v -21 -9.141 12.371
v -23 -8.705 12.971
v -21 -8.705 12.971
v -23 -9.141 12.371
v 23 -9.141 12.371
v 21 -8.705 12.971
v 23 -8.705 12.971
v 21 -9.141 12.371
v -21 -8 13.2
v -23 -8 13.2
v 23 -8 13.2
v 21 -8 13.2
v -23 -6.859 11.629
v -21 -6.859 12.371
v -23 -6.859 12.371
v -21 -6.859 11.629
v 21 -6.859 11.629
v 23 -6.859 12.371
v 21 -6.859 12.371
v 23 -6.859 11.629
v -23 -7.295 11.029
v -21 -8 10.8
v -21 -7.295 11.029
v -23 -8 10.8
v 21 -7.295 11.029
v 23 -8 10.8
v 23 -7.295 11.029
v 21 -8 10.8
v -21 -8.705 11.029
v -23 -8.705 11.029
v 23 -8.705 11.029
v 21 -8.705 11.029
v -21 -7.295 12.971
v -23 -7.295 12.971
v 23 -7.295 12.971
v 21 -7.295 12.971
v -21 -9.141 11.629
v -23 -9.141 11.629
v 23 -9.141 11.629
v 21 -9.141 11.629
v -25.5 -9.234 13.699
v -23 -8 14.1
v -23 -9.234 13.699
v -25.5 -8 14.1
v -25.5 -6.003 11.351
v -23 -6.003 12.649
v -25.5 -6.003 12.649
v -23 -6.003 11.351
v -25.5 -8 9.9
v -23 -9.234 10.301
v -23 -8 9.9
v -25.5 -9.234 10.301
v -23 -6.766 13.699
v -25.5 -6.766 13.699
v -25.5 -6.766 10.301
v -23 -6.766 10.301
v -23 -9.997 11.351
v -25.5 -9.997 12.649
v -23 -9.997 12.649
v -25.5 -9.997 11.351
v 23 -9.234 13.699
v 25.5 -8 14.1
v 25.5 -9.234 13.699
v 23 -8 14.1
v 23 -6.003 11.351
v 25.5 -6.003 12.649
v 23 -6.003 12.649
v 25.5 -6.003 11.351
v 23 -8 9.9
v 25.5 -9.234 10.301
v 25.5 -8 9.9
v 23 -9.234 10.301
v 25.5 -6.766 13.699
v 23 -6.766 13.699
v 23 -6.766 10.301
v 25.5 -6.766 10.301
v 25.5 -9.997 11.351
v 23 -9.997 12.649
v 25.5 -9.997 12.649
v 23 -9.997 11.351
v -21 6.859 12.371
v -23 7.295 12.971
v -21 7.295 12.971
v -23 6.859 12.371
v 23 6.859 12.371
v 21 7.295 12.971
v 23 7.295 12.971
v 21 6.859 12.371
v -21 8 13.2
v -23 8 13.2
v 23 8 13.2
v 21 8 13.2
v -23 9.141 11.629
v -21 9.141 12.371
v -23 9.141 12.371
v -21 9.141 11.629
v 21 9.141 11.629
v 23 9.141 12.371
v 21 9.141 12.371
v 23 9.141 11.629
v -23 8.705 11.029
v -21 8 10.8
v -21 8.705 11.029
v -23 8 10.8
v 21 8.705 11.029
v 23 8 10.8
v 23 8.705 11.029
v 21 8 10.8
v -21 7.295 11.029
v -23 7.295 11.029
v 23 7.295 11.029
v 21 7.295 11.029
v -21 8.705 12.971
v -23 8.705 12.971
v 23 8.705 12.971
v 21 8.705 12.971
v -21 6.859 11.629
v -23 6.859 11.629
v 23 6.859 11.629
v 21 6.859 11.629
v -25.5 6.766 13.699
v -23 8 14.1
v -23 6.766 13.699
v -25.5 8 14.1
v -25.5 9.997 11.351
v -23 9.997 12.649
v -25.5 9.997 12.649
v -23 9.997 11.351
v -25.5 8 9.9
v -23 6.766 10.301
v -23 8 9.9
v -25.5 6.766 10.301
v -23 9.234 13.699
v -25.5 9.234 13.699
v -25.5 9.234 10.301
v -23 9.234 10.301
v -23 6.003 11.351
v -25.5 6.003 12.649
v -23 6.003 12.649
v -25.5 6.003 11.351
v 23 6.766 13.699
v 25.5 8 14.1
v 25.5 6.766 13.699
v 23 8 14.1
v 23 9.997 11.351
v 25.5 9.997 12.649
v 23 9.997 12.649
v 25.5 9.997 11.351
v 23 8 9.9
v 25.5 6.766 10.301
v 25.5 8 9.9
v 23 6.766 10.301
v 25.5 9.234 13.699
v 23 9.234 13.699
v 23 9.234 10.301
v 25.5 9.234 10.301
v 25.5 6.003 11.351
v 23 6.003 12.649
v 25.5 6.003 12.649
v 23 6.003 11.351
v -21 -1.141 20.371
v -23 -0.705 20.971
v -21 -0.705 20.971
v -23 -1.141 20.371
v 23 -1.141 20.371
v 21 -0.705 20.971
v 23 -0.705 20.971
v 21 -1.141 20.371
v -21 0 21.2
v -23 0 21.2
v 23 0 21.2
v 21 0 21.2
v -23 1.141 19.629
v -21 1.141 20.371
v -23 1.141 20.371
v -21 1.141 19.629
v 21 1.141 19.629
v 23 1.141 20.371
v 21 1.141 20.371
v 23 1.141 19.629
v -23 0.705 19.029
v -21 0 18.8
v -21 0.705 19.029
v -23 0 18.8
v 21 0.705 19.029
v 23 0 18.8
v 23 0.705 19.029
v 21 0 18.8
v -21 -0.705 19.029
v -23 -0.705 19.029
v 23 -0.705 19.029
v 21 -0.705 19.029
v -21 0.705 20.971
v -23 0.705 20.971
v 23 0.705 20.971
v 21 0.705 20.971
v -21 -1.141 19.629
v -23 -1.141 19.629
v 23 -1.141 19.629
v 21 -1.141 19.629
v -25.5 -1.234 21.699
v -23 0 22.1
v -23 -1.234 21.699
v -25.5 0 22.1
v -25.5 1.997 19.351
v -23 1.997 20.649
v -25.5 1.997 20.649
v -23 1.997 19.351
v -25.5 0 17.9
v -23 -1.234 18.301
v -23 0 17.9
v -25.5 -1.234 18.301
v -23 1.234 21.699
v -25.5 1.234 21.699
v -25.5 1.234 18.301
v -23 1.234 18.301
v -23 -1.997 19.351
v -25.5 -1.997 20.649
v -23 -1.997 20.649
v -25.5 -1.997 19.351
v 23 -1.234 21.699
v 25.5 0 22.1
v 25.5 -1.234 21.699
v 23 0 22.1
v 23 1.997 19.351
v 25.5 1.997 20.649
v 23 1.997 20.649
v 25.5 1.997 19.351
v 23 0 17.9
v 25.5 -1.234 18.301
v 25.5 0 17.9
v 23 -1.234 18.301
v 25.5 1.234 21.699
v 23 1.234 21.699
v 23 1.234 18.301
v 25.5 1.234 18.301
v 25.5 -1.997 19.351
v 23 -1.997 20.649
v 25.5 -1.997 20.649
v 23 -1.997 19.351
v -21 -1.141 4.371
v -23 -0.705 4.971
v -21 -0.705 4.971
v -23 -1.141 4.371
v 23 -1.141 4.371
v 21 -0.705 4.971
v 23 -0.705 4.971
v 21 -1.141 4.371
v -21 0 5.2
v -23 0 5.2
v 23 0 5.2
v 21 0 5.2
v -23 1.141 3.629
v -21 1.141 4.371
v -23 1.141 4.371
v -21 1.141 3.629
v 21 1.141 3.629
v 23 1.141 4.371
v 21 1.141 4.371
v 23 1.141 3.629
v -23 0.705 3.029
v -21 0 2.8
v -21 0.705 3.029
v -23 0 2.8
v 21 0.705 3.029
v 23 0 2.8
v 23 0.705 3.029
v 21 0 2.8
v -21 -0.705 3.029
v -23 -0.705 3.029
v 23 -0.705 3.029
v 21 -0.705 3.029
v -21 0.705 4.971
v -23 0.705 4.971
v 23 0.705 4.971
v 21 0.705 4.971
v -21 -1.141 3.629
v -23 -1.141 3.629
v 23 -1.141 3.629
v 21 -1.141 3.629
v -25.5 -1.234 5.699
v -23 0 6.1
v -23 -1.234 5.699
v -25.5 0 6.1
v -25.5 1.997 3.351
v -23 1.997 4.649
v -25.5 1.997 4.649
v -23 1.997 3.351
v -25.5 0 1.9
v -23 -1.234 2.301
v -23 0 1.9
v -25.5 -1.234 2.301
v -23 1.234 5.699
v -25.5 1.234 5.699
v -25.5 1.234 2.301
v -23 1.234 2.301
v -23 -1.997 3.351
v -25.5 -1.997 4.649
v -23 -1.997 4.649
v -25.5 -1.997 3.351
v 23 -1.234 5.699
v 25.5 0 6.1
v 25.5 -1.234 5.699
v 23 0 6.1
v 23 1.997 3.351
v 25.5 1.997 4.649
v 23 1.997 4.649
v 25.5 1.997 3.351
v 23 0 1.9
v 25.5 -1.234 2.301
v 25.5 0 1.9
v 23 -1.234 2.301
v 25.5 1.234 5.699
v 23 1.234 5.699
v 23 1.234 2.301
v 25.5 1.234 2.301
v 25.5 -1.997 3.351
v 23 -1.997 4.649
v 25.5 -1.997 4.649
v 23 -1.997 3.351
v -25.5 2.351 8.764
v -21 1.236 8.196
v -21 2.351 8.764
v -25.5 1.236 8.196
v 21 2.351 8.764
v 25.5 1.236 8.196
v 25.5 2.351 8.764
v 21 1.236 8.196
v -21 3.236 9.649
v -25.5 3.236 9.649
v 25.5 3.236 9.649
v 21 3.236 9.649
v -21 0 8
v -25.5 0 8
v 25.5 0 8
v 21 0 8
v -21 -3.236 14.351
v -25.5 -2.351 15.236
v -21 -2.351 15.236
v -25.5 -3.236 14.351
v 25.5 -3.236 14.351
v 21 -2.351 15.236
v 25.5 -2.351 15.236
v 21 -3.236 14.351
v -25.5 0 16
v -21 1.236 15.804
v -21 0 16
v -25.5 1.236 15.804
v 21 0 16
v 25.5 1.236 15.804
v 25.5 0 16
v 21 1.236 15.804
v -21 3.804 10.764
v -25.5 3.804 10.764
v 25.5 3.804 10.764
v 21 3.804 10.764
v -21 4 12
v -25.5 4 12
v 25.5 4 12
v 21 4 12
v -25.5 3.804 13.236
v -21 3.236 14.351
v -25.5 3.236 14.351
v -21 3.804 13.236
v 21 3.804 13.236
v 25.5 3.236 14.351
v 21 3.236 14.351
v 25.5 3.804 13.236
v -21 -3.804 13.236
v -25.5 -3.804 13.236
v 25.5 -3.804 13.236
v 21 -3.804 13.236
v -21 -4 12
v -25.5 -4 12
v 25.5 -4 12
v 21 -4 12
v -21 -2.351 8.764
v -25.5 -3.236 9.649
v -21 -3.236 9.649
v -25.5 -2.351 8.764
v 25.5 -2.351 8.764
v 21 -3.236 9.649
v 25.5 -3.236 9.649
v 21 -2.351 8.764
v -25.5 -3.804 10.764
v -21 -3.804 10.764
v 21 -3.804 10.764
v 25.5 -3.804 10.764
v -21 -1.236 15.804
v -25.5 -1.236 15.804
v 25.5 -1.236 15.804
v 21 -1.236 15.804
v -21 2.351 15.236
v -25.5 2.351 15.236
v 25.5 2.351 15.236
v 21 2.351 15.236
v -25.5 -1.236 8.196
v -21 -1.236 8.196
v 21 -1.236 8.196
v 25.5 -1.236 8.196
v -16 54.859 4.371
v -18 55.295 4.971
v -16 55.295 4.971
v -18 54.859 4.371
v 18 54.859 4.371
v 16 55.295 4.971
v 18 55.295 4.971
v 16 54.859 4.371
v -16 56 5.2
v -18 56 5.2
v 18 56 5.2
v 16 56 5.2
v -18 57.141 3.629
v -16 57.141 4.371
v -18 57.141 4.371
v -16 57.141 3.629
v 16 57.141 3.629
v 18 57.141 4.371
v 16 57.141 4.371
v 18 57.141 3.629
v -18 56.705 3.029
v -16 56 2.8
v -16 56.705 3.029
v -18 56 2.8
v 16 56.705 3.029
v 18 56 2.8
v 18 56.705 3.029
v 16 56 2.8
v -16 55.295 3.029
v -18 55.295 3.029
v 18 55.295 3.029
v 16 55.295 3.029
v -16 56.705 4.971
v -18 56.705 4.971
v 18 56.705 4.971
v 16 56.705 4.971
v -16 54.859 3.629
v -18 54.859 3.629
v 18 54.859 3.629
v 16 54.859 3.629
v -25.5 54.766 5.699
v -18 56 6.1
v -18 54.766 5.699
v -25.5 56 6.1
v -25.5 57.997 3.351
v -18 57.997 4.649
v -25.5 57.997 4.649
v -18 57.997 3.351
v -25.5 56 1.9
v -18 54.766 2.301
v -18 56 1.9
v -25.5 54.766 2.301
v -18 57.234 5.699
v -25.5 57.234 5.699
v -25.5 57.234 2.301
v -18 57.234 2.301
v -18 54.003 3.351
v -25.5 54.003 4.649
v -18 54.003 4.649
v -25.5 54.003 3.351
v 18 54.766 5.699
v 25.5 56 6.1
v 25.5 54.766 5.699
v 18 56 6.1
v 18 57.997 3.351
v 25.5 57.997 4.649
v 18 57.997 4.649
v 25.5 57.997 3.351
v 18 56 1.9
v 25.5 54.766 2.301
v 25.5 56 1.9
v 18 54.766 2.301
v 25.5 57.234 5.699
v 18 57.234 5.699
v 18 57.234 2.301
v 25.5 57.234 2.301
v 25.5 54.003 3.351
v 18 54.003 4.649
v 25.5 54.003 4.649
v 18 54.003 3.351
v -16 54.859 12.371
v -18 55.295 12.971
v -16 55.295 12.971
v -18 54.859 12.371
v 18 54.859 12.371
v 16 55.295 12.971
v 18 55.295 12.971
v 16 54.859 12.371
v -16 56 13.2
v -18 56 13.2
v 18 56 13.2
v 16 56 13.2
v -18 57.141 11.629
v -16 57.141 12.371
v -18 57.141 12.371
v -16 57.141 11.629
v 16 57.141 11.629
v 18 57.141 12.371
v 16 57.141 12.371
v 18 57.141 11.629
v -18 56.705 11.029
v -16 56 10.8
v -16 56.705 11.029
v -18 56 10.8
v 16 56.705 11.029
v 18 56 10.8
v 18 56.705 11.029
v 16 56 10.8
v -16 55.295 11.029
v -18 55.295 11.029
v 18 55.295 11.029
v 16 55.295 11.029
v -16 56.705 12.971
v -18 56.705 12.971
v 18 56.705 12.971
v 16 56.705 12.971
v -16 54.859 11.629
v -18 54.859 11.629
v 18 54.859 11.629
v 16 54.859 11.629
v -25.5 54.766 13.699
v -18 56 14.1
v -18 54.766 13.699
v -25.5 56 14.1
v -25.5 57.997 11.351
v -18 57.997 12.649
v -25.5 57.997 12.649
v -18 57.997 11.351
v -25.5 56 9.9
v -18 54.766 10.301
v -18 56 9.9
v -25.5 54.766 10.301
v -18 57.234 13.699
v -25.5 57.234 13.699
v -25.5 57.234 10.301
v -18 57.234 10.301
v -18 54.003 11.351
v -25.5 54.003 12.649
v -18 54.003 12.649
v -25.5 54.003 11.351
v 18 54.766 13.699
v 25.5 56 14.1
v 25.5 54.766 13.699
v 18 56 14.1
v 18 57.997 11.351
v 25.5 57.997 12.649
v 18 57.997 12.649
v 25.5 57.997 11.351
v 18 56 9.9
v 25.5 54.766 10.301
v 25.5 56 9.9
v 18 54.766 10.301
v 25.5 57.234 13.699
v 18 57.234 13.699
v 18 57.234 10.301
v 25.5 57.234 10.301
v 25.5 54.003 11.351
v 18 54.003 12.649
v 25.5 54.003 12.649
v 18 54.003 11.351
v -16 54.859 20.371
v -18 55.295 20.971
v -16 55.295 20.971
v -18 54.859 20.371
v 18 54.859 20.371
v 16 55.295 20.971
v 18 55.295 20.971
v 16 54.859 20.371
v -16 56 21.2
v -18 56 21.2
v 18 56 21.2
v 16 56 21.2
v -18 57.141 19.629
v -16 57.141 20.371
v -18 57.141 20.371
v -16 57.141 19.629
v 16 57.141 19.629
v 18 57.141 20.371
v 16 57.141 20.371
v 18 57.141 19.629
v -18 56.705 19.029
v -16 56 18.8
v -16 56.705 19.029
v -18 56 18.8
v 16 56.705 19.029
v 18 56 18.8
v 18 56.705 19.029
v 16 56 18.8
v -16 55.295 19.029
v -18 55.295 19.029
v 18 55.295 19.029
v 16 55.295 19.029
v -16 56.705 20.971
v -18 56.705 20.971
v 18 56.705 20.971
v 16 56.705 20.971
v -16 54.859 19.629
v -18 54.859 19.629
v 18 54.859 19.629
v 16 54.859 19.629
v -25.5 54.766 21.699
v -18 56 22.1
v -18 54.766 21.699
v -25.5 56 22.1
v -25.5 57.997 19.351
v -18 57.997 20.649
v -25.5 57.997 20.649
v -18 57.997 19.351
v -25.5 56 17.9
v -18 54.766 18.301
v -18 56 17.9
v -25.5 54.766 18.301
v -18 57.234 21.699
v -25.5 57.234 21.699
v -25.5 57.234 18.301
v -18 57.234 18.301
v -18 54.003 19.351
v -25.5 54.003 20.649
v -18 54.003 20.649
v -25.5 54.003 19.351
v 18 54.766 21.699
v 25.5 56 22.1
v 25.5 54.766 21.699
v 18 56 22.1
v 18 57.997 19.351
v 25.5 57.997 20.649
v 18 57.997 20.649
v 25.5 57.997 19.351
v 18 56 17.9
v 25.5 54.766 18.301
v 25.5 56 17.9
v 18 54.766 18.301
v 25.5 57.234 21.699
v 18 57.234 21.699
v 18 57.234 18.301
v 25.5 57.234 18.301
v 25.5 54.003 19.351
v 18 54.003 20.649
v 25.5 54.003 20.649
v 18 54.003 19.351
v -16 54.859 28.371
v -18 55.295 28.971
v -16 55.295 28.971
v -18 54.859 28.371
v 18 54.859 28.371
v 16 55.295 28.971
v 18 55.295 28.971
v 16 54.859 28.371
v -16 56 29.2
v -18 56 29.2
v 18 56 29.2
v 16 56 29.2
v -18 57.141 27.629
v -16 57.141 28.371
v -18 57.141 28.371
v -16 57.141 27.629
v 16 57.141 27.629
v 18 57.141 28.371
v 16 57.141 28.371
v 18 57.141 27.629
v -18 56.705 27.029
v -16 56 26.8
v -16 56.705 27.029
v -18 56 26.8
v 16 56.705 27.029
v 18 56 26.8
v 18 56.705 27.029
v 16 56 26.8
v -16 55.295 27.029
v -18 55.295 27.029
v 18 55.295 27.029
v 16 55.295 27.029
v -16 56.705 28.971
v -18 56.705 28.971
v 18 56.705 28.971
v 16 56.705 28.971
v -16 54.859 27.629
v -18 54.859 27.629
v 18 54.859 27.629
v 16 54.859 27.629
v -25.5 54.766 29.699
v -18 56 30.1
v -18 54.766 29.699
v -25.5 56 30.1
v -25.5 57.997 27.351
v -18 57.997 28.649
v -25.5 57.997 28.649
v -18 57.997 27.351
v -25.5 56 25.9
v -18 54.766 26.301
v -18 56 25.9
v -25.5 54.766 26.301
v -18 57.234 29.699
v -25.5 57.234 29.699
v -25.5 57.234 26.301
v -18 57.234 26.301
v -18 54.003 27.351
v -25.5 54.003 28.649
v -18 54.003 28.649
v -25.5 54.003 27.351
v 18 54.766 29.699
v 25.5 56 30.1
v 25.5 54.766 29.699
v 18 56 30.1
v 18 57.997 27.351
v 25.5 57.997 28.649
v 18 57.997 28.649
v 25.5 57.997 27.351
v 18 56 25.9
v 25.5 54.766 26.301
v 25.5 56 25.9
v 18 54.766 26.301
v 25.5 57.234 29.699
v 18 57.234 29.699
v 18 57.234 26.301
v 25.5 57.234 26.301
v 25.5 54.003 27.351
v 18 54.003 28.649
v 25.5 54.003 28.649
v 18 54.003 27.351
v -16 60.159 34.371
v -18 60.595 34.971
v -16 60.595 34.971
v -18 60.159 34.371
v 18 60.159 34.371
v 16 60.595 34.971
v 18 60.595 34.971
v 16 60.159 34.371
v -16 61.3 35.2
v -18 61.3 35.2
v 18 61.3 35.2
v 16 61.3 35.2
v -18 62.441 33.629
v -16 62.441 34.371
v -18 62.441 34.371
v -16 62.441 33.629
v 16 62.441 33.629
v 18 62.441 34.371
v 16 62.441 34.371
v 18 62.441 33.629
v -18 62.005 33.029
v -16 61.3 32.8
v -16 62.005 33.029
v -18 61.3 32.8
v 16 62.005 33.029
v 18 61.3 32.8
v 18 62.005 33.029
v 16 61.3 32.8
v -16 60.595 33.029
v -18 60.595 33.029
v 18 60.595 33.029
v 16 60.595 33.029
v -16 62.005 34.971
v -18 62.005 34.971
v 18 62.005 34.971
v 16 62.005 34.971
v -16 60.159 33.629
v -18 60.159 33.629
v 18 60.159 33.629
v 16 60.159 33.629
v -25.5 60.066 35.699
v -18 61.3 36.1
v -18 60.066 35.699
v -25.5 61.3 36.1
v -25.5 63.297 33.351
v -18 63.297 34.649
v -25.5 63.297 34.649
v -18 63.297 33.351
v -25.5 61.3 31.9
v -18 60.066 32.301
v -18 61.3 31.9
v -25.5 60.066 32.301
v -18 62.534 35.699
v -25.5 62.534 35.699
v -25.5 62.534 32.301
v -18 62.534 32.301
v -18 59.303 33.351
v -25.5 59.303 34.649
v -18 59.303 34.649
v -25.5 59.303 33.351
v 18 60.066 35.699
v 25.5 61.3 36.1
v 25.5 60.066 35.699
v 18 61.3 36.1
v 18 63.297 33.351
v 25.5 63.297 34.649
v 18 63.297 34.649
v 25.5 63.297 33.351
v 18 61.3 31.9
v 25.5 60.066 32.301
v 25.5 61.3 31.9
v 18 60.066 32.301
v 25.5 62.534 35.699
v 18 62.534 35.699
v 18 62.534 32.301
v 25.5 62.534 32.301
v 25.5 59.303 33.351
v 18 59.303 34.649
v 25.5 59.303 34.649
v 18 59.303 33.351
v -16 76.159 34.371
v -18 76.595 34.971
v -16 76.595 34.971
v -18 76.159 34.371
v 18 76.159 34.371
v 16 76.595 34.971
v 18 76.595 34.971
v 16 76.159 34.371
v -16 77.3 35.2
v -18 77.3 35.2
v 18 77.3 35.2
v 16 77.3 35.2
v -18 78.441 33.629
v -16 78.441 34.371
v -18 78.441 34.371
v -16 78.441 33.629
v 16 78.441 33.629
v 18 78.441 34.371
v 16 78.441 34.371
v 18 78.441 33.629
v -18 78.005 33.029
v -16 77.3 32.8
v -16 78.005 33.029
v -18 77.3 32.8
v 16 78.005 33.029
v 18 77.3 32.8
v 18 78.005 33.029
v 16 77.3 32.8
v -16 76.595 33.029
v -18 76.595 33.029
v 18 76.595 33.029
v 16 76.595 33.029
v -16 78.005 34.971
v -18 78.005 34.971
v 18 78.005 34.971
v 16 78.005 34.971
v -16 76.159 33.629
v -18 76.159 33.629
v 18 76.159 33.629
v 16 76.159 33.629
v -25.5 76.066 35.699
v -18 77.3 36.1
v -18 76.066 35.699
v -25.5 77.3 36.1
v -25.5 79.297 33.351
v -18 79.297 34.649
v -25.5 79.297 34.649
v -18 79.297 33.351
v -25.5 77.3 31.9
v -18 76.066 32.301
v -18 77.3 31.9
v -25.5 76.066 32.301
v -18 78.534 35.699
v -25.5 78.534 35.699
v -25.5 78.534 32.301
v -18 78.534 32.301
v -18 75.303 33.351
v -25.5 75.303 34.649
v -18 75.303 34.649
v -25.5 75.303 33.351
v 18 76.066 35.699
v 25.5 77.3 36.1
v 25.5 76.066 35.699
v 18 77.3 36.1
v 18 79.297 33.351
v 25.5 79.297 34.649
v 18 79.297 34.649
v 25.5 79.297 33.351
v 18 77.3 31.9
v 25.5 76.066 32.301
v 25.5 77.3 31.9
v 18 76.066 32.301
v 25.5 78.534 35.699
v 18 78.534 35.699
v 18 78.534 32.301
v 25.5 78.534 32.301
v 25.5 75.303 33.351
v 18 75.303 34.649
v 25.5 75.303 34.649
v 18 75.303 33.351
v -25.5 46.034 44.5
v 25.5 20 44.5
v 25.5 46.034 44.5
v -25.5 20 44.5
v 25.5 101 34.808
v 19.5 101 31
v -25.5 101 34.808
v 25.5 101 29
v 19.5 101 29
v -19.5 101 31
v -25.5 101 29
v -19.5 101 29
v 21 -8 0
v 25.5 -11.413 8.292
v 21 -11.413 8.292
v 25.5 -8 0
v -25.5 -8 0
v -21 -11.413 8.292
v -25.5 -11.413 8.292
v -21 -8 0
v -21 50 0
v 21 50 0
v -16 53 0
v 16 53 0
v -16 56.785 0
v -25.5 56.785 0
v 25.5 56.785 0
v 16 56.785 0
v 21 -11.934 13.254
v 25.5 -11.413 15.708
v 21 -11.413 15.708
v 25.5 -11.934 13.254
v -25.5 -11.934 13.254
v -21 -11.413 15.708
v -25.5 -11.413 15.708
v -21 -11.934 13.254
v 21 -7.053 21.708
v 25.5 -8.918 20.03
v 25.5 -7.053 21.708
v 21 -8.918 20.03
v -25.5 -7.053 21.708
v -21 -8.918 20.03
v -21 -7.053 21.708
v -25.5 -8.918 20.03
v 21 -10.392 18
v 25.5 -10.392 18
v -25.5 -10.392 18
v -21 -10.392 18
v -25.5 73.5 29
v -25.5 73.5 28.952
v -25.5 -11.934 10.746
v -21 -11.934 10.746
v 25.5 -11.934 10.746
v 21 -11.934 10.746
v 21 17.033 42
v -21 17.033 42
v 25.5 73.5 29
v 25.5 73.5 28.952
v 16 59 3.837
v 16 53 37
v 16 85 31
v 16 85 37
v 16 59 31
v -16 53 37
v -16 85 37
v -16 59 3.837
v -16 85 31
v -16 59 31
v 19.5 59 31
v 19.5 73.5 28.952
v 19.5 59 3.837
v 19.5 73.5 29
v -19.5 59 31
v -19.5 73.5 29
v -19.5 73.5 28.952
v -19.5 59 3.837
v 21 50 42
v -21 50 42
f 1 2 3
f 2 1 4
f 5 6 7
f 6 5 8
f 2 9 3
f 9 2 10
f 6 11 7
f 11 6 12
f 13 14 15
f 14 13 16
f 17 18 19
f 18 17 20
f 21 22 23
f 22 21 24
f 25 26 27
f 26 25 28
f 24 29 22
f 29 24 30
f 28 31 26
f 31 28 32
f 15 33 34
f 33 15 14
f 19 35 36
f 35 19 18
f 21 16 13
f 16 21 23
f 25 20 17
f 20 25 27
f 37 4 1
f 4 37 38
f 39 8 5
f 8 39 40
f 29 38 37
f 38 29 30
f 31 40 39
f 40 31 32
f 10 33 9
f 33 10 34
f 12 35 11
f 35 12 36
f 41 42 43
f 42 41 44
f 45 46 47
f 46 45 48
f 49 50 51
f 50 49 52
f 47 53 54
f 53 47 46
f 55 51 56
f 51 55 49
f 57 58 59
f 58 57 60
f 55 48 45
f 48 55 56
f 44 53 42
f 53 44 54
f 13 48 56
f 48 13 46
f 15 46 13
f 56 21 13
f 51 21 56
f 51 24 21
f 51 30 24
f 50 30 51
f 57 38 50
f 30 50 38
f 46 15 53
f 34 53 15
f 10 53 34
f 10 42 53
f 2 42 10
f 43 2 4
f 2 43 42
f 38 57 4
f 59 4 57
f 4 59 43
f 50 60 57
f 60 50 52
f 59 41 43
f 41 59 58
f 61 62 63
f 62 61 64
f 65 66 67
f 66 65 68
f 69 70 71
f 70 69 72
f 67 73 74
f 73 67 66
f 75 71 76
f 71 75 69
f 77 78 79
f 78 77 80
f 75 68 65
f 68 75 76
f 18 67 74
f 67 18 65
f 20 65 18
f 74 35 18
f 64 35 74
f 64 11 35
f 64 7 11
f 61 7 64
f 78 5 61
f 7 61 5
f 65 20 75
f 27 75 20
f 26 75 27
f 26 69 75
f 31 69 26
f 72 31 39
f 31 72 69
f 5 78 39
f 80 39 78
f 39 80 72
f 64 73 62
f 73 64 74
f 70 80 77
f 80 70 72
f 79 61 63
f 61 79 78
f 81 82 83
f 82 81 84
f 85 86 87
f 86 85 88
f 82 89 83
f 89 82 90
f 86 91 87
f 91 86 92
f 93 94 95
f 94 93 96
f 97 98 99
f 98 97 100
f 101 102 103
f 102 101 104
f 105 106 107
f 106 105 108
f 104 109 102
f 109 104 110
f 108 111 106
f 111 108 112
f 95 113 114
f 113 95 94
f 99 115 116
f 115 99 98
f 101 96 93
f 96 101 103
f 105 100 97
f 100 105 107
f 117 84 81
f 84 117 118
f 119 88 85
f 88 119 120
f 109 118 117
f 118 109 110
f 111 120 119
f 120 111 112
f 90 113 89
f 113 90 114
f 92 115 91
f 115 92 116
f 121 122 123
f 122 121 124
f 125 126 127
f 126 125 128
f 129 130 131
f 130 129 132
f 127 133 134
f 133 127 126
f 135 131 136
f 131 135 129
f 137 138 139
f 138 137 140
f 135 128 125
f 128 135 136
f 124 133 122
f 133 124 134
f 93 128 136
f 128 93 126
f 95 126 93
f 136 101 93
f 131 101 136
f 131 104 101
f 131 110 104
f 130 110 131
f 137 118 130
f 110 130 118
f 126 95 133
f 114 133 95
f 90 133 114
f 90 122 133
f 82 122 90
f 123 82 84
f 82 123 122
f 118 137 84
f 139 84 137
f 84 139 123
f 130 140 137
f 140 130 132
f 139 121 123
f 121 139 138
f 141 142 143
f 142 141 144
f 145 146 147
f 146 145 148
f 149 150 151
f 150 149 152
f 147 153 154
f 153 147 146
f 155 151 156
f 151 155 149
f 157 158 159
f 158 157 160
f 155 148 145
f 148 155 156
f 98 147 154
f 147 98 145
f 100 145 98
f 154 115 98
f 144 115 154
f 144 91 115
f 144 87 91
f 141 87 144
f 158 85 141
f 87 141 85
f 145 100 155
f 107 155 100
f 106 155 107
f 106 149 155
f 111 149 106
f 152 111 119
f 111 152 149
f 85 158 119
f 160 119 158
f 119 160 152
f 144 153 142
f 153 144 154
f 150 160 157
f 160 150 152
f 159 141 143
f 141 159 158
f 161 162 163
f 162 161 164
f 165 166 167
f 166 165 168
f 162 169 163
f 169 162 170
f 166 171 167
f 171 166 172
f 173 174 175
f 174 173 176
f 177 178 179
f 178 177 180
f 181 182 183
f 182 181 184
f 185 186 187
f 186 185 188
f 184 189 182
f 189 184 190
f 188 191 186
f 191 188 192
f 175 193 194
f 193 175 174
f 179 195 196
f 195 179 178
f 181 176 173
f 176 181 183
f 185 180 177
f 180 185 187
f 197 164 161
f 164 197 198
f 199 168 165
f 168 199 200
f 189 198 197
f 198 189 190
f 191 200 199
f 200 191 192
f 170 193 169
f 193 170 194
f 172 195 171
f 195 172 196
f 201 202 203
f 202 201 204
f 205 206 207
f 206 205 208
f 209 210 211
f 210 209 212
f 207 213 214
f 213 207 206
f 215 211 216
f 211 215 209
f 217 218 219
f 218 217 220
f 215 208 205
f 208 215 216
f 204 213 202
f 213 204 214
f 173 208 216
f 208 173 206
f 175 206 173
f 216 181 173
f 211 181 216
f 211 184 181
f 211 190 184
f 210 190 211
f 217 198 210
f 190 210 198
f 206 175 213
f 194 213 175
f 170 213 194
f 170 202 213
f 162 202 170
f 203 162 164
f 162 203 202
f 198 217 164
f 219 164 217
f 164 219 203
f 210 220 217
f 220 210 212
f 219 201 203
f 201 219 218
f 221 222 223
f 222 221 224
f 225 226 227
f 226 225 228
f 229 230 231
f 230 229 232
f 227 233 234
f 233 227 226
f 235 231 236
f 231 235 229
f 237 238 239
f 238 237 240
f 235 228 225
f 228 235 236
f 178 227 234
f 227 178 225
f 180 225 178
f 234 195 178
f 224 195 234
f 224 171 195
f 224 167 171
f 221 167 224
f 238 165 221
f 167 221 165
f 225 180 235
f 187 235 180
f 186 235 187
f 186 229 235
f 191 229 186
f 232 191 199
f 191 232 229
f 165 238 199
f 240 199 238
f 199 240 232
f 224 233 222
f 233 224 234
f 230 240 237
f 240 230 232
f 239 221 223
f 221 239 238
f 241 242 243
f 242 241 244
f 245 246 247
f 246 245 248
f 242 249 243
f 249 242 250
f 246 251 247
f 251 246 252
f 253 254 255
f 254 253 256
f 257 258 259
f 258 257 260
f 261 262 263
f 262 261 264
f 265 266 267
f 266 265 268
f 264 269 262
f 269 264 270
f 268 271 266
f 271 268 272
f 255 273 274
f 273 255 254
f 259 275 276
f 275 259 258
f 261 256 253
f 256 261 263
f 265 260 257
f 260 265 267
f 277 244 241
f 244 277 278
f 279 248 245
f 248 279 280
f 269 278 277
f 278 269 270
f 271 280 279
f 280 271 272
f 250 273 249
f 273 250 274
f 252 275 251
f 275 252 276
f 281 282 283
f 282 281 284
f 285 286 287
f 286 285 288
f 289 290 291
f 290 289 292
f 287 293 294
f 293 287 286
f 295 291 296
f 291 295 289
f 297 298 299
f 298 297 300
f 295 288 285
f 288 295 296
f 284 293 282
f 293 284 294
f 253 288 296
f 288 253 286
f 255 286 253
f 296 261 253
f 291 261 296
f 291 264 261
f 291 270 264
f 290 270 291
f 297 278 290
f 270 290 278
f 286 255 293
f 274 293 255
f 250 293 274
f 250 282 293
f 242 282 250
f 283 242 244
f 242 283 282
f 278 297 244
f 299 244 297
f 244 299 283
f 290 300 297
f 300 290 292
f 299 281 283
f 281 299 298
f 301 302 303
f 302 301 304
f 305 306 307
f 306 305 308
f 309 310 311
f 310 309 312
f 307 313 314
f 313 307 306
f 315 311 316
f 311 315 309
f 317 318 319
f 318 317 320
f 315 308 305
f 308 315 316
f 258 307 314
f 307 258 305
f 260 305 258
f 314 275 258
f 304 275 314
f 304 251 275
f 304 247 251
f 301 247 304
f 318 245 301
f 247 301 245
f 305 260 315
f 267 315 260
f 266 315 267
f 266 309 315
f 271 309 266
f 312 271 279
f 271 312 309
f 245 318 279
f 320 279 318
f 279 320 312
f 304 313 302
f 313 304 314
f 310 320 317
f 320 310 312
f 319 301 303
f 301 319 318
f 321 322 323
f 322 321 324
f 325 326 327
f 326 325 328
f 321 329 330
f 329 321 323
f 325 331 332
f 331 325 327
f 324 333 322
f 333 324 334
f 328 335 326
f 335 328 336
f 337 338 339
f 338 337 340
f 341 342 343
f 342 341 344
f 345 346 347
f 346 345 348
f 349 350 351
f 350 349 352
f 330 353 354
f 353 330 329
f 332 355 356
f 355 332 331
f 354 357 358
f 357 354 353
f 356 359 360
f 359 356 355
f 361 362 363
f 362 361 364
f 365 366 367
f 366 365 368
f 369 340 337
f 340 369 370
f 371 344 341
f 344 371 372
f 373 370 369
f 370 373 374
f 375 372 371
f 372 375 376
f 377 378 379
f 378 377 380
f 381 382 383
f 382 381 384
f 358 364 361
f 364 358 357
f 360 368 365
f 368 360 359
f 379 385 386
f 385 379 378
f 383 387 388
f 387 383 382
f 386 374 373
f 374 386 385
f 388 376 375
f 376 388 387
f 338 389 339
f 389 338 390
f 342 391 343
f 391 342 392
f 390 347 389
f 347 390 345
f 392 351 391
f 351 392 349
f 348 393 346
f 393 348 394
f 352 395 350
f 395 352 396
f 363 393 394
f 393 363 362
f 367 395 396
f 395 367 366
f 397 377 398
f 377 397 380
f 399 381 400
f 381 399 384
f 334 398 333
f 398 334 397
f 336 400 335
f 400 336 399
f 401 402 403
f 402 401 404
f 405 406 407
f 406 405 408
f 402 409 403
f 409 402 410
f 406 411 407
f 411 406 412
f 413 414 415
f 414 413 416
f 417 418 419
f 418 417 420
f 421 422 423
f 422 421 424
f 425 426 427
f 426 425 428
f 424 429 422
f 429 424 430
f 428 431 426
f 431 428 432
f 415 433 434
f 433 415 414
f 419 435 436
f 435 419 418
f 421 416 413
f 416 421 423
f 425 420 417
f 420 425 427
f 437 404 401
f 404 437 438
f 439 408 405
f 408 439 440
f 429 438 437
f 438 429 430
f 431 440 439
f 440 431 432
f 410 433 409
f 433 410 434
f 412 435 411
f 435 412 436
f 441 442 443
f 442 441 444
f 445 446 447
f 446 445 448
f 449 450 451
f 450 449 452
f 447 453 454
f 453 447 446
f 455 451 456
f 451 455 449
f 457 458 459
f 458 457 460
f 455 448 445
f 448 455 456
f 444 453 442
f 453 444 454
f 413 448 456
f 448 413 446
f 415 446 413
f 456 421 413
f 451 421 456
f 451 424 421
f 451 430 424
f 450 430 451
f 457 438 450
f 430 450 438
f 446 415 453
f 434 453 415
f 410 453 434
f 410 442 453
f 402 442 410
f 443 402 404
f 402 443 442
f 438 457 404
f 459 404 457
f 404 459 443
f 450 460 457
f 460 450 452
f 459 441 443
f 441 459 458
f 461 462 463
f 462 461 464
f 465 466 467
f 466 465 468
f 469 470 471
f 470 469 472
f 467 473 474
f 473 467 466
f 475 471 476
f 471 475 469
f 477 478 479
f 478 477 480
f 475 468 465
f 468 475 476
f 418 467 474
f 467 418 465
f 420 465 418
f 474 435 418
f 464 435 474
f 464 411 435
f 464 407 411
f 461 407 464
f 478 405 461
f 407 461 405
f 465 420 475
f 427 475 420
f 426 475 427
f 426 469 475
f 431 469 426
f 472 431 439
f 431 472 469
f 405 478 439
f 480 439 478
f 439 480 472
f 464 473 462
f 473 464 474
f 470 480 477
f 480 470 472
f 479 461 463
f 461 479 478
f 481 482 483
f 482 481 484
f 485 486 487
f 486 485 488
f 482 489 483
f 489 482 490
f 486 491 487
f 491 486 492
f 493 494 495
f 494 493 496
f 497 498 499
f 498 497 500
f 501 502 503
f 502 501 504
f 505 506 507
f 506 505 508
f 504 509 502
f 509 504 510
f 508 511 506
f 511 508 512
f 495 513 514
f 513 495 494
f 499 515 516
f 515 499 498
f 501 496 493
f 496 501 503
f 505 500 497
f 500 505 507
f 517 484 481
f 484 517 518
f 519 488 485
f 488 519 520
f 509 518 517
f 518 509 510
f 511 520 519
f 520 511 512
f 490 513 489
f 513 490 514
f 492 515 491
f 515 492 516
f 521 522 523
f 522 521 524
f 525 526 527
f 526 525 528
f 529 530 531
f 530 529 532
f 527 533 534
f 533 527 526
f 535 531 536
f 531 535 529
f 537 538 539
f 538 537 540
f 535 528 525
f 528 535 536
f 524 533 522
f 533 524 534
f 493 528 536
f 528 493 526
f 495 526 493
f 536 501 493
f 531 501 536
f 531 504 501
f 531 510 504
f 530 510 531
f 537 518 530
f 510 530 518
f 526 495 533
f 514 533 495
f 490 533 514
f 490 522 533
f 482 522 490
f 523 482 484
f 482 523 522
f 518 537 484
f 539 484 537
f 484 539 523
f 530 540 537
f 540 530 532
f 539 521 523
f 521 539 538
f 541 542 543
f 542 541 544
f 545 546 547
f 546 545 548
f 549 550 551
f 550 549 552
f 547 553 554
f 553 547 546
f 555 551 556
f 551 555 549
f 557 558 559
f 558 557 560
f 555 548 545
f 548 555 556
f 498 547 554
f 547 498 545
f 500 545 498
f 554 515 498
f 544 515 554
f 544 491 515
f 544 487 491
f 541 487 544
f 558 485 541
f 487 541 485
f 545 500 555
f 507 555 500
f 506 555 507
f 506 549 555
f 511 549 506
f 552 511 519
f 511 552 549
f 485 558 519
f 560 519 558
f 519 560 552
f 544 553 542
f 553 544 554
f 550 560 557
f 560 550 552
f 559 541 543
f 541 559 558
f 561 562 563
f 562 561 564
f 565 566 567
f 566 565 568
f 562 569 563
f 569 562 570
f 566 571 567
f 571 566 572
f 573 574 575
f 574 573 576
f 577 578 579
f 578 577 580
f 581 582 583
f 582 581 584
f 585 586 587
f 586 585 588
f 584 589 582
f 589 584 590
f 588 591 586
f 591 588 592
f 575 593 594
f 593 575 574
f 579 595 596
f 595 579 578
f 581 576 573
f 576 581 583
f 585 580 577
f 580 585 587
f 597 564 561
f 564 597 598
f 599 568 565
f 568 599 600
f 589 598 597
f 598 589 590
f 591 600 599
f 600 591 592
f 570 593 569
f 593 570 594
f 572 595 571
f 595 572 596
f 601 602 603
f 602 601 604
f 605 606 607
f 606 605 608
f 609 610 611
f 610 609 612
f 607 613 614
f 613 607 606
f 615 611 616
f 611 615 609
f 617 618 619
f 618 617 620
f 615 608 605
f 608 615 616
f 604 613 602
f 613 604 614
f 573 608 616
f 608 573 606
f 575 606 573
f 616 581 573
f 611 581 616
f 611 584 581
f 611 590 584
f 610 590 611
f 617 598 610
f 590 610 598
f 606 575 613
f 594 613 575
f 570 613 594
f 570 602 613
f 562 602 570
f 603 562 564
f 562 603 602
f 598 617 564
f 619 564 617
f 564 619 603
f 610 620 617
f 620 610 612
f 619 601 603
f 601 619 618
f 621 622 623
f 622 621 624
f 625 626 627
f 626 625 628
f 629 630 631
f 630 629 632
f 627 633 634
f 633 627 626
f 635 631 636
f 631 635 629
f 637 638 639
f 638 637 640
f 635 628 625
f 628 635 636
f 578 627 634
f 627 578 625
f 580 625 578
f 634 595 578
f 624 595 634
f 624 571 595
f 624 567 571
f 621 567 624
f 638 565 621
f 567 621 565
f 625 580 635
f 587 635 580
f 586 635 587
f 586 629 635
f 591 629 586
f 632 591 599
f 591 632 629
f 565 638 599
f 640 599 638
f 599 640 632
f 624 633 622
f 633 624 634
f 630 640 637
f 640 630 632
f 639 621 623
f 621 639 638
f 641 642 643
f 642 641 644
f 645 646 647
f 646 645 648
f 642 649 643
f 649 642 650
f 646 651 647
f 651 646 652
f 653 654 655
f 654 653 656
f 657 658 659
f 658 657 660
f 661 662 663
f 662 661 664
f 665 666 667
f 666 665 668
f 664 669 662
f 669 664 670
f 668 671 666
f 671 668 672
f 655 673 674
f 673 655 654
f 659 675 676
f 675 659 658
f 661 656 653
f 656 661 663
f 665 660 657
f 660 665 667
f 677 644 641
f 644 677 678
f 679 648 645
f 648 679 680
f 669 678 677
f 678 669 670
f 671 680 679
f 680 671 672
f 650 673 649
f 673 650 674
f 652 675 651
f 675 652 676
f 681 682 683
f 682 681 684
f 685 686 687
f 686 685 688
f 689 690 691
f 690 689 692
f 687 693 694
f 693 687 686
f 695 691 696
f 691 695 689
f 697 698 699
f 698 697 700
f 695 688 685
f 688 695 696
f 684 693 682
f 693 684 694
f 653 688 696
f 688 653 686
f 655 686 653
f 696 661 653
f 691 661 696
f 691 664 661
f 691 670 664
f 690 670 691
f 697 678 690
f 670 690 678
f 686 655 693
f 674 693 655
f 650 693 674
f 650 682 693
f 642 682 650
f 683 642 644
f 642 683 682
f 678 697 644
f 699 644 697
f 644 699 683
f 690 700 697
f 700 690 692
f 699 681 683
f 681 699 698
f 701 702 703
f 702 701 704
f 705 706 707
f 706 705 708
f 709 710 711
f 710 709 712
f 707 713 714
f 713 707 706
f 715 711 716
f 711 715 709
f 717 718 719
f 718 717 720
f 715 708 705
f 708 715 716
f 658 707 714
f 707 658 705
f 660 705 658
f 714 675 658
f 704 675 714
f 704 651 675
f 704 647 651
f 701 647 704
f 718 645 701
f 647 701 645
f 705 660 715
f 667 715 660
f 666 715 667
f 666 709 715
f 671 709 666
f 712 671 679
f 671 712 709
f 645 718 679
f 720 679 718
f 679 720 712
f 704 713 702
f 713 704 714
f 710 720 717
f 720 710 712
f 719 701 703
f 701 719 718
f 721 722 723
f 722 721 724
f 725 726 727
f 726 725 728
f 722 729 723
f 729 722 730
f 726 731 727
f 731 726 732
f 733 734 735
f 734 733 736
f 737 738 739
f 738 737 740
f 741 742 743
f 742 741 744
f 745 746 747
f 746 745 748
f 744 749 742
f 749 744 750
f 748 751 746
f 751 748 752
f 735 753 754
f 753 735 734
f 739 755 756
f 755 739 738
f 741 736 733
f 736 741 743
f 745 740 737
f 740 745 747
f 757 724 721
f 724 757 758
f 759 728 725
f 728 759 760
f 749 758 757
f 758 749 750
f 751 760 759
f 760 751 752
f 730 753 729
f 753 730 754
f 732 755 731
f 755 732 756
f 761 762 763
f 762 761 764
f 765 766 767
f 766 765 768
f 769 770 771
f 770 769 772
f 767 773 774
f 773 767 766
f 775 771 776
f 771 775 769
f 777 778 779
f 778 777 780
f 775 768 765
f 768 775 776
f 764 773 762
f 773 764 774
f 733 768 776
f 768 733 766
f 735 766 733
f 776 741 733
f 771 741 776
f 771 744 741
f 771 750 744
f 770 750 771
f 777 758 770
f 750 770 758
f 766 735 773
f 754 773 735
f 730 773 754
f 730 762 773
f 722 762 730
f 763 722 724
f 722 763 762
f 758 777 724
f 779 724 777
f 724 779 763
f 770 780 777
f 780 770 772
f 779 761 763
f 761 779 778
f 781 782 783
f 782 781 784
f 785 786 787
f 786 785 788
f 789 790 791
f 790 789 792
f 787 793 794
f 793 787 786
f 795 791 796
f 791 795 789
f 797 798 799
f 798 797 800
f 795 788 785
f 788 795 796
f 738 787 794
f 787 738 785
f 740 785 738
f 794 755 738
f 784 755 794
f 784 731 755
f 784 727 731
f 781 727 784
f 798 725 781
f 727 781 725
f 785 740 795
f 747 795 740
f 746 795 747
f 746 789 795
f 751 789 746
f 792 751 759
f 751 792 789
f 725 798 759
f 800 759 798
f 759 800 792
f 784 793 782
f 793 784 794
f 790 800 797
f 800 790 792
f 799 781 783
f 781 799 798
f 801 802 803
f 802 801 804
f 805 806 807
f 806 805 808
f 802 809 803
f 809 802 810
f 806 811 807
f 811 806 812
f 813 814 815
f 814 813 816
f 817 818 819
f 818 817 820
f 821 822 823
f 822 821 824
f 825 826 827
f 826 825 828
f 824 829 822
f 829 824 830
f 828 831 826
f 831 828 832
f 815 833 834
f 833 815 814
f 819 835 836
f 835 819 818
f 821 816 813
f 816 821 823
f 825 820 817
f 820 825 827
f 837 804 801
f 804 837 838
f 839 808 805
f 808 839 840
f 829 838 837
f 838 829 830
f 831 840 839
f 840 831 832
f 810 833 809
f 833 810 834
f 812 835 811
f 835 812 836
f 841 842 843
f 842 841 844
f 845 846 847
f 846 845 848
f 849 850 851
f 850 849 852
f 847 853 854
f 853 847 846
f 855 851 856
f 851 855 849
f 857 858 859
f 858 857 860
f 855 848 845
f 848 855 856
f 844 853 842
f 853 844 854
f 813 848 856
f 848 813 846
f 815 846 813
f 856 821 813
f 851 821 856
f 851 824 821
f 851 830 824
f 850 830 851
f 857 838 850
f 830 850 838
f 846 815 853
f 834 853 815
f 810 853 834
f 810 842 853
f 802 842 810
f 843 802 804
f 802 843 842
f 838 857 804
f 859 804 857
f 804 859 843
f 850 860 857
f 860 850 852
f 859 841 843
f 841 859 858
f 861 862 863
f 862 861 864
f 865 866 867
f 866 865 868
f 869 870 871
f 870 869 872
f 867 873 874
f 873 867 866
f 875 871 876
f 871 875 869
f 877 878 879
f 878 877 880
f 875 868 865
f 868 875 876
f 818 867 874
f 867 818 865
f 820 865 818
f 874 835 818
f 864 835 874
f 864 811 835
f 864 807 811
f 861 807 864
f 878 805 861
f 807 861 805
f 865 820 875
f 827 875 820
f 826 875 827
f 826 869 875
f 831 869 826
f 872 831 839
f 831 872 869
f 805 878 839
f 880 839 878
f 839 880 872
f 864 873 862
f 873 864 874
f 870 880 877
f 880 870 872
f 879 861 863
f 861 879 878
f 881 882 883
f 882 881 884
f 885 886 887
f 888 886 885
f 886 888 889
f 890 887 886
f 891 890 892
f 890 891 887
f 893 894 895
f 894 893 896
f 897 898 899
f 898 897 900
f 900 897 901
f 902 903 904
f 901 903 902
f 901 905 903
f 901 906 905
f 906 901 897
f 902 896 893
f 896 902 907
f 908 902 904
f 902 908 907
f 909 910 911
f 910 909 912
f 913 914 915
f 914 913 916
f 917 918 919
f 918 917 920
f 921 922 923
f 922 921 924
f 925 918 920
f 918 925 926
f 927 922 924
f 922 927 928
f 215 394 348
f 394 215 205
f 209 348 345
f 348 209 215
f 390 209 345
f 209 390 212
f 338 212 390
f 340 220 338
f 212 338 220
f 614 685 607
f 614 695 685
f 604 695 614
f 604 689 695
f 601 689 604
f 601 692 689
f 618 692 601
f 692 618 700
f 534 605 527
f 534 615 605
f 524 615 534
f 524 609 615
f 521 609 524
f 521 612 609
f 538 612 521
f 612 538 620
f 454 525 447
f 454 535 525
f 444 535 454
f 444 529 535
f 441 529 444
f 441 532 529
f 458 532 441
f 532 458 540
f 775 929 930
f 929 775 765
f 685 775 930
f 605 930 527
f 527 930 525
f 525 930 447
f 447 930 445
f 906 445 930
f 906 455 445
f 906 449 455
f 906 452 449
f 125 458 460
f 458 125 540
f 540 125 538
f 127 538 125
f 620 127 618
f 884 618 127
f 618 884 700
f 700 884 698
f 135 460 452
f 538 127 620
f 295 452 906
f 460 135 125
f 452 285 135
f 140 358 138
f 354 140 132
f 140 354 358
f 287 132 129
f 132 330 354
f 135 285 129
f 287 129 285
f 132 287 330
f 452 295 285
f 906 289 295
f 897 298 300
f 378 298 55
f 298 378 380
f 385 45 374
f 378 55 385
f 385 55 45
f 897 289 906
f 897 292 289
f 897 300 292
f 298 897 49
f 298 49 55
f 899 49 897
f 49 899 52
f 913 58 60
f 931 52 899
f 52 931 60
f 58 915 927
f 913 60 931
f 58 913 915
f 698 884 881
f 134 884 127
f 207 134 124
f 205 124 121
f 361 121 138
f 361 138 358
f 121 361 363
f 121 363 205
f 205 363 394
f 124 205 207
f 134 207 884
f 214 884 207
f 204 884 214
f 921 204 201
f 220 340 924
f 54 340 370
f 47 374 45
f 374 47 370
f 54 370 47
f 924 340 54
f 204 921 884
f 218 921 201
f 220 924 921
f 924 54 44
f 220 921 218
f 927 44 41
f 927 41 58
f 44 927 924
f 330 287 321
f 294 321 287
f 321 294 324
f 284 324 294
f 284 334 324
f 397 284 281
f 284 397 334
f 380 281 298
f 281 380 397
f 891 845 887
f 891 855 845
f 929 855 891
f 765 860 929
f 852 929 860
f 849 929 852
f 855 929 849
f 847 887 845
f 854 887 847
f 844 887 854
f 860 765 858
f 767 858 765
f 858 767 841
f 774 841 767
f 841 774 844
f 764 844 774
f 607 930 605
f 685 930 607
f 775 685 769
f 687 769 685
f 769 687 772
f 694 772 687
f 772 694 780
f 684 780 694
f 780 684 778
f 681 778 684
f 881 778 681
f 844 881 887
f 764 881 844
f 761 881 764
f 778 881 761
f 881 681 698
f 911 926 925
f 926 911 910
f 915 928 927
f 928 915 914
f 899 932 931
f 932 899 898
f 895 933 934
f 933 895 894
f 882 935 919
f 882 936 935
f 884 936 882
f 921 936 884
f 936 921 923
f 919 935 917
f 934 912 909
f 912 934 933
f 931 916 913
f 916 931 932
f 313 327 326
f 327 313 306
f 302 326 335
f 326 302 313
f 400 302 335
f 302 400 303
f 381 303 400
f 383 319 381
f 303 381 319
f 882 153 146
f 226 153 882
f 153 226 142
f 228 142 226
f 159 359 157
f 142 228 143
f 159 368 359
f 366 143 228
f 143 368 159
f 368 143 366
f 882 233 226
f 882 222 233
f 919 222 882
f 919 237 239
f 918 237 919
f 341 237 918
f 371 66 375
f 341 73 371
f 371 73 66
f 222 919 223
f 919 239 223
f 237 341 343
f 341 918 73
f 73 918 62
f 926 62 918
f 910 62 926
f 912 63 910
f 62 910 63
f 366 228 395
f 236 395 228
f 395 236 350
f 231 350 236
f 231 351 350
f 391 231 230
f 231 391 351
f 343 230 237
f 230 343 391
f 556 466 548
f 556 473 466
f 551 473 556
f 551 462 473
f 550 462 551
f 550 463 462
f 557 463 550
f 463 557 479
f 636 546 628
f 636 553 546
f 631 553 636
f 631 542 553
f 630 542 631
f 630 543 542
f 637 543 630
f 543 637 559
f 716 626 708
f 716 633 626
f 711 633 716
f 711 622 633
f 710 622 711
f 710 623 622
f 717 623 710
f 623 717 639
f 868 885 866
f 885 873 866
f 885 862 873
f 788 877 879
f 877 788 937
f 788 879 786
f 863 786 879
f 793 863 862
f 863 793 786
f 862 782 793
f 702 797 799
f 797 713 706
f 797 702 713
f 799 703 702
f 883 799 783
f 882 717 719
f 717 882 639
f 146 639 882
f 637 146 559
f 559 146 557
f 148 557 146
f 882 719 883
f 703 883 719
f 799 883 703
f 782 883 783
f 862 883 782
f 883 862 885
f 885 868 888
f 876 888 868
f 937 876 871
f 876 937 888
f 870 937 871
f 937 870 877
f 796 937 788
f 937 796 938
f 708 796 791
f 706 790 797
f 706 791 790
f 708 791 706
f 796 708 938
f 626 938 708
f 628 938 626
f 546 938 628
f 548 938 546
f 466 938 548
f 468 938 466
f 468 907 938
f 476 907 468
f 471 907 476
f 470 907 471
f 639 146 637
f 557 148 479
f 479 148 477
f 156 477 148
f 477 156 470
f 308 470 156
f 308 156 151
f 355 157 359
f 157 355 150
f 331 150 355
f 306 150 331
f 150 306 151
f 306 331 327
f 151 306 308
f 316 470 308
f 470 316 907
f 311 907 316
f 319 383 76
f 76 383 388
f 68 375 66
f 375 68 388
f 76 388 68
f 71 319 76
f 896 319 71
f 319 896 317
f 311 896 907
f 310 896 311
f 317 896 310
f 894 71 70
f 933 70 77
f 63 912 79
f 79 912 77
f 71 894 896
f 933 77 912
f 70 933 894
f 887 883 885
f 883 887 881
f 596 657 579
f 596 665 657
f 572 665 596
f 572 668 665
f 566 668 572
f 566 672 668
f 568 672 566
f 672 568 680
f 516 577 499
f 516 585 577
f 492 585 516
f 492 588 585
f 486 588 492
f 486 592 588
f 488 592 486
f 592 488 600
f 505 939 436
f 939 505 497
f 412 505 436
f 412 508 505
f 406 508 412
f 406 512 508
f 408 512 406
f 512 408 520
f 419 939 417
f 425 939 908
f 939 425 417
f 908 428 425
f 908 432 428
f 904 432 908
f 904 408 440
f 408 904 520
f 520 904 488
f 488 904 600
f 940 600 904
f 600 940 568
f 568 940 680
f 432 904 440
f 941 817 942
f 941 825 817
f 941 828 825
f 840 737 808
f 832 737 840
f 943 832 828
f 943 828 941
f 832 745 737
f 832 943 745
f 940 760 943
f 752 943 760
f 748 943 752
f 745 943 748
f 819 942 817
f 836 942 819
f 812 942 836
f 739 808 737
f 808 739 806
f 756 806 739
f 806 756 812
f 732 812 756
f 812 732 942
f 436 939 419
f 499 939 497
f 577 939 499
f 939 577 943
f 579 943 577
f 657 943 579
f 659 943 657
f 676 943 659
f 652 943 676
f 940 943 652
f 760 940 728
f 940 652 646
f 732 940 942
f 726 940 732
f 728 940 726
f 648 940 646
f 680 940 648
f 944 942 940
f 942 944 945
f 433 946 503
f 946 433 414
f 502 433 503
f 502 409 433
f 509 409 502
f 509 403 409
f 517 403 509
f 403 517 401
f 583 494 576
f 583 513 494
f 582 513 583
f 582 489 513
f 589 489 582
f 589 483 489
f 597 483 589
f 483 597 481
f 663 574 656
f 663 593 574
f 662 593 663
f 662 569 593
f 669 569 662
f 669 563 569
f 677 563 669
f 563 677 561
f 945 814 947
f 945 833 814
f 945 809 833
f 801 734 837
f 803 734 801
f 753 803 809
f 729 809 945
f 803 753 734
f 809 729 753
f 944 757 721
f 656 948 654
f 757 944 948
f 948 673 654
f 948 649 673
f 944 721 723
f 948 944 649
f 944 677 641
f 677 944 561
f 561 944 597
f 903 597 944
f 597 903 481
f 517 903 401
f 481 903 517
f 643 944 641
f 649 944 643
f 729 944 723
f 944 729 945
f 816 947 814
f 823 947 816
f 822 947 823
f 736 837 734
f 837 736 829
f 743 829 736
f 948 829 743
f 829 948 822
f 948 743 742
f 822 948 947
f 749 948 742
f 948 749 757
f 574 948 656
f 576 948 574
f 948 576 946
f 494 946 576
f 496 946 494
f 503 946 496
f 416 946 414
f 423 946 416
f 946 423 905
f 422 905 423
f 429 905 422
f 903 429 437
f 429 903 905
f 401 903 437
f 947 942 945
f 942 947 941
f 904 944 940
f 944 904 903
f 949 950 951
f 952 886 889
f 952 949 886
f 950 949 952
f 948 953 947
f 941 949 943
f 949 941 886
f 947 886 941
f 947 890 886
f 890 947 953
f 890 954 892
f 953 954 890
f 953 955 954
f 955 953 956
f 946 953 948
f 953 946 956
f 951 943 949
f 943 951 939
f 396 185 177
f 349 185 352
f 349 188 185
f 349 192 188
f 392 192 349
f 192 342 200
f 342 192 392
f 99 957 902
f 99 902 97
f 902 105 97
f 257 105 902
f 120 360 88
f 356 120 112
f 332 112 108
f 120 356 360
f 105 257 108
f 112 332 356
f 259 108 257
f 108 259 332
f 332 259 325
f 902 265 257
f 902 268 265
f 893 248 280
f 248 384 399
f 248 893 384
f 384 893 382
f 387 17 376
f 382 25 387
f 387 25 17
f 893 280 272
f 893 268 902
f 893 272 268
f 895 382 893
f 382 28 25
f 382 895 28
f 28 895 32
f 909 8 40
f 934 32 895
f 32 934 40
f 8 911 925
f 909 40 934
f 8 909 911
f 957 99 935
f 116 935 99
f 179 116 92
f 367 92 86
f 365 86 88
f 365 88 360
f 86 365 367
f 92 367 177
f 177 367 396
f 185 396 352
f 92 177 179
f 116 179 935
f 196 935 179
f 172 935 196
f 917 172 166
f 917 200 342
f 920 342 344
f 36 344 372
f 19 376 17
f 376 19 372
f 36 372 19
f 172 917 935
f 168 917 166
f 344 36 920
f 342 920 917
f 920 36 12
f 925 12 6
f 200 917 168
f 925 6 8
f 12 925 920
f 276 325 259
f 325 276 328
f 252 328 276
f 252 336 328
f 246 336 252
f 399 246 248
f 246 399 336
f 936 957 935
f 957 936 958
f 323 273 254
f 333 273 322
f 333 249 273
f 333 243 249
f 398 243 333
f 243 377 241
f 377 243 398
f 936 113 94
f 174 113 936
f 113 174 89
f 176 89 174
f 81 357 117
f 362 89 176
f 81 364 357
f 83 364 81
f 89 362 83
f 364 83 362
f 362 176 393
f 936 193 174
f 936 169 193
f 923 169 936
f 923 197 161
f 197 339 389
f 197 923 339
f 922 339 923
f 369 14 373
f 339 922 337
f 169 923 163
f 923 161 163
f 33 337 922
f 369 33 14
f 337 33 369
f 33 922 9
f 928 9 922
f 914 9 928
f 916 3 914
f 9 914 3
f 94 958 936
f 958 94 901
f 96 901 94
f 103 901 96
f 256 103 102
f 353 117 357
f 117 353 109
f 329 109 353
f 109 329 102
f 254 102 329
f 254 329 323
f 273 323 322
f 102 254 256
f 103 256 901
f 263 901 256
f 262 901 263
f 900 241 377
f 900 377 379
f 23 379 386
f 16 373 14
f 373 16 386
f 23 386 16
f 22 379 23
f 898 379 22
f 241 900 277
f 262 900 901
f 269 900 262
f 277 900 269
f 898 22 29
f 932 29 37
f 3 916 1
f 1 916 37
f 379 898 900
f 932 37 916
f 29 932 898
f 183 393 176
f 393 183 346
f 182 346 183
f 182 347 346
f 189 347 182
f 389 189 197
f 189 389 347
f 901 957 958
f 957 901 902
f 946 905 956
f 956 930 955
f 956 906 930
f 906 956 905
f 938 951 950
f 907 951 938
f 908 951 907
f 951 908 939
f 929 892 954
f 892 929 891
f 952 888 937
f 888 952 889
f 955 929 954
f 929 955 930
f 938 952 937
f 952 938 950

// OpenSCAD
espesor=4.5;

module tornillo(d){
	union(){
		rotate([0,90,0])cylinder(r=1.2,h=60,$fn=10);
		translate([-1-d,0,0])rotate([0,90,0])cylinder(r=2.1,h=10,$fn=10);
		translate([51+d,0,0])rotate([0,90,0])cylinder(r=2.1,h=10,$fn=10);


	}
}

module eje(){
	rotate([0,90,0])cylinder(r=4,h=60,$fn=20);
	translate([0,-8,0])tornillo(2);
	translate([0,8,0])tornillo(2);
	translate([0,0,8])tornillo(2);
	translate([0,0,-8])tornillo(2);
}

module agujeros_servo(){
	translate([0,0,-8]) tornillo(-3);
	translate([0,0,0]) tornillo(-3);
	translate([0,0,8]) tornillo(-3);
	translate([0,0,16]) tornillo(-3);
	translate([0,5.3,22]) tornillo(-3);
	translate([0,5.3+16,22]) tornillo(-3);
}

y=32;
union(){
translate([0,0,12])
difference(){
	hull(){
	translate([-(42+espesor*2)/2,-12+y,-12])cube([42+espesor*2,113-y,40+espesor]);
	translate([-25.5,0,0])rotate([0,90,0])cylinder(r=12,h=51);
	translate([-51/2,-8,-12])cube([51,5,4]);
	translate([-51/2,-4,-12])cube([51,4,1]);
	}
	rotate([-10,0,0])translate([-50,0,40])cube(100);
	translate([-32/2,53,-21])cube([32,32,46]);
	translate([-19.5,59,-19])cube([39,50,38]);
	translate([-42/2,-38,-13])cube([42,44+42+2,43]);
	translate([-30,0,0])eje();

	translate([-30,56,0])agujeros_servo();
	//%translate([-30,-72,28])rotate([-45,0,0])cube([60,60,80]);
	//%translate([-30,-72,-27])rotate([-45,0,0])cube([60,60,60]);
	translate([-30,36,-48])rotate([-30,0,0])cube([60,60,75]);
	translate([-30,73.5,-58])rotate([0,0,0])cube([60,60,75]);
	//translate([-50,-111,-12])cube(100);
}
//SOPORTES


%translate([7,18.5,0])cube([2,30,43]);
%mirror([10,0,0])translate([7,18.5,0])cube([2,30,43]);

%translate([7,54,0])cube([2,30,37]);
%mirror([10,0,0])translate([7,54,0])cube([2,30,37]);

%translate([7,87,0])cube([1.5,14,35]);
%mirror([10,0,0])translate([7,87,0])cube([1.5,14,35]);

%translate([25.5,98,0])rotate([0,0,90])cube([1.5,51,35]);



}
